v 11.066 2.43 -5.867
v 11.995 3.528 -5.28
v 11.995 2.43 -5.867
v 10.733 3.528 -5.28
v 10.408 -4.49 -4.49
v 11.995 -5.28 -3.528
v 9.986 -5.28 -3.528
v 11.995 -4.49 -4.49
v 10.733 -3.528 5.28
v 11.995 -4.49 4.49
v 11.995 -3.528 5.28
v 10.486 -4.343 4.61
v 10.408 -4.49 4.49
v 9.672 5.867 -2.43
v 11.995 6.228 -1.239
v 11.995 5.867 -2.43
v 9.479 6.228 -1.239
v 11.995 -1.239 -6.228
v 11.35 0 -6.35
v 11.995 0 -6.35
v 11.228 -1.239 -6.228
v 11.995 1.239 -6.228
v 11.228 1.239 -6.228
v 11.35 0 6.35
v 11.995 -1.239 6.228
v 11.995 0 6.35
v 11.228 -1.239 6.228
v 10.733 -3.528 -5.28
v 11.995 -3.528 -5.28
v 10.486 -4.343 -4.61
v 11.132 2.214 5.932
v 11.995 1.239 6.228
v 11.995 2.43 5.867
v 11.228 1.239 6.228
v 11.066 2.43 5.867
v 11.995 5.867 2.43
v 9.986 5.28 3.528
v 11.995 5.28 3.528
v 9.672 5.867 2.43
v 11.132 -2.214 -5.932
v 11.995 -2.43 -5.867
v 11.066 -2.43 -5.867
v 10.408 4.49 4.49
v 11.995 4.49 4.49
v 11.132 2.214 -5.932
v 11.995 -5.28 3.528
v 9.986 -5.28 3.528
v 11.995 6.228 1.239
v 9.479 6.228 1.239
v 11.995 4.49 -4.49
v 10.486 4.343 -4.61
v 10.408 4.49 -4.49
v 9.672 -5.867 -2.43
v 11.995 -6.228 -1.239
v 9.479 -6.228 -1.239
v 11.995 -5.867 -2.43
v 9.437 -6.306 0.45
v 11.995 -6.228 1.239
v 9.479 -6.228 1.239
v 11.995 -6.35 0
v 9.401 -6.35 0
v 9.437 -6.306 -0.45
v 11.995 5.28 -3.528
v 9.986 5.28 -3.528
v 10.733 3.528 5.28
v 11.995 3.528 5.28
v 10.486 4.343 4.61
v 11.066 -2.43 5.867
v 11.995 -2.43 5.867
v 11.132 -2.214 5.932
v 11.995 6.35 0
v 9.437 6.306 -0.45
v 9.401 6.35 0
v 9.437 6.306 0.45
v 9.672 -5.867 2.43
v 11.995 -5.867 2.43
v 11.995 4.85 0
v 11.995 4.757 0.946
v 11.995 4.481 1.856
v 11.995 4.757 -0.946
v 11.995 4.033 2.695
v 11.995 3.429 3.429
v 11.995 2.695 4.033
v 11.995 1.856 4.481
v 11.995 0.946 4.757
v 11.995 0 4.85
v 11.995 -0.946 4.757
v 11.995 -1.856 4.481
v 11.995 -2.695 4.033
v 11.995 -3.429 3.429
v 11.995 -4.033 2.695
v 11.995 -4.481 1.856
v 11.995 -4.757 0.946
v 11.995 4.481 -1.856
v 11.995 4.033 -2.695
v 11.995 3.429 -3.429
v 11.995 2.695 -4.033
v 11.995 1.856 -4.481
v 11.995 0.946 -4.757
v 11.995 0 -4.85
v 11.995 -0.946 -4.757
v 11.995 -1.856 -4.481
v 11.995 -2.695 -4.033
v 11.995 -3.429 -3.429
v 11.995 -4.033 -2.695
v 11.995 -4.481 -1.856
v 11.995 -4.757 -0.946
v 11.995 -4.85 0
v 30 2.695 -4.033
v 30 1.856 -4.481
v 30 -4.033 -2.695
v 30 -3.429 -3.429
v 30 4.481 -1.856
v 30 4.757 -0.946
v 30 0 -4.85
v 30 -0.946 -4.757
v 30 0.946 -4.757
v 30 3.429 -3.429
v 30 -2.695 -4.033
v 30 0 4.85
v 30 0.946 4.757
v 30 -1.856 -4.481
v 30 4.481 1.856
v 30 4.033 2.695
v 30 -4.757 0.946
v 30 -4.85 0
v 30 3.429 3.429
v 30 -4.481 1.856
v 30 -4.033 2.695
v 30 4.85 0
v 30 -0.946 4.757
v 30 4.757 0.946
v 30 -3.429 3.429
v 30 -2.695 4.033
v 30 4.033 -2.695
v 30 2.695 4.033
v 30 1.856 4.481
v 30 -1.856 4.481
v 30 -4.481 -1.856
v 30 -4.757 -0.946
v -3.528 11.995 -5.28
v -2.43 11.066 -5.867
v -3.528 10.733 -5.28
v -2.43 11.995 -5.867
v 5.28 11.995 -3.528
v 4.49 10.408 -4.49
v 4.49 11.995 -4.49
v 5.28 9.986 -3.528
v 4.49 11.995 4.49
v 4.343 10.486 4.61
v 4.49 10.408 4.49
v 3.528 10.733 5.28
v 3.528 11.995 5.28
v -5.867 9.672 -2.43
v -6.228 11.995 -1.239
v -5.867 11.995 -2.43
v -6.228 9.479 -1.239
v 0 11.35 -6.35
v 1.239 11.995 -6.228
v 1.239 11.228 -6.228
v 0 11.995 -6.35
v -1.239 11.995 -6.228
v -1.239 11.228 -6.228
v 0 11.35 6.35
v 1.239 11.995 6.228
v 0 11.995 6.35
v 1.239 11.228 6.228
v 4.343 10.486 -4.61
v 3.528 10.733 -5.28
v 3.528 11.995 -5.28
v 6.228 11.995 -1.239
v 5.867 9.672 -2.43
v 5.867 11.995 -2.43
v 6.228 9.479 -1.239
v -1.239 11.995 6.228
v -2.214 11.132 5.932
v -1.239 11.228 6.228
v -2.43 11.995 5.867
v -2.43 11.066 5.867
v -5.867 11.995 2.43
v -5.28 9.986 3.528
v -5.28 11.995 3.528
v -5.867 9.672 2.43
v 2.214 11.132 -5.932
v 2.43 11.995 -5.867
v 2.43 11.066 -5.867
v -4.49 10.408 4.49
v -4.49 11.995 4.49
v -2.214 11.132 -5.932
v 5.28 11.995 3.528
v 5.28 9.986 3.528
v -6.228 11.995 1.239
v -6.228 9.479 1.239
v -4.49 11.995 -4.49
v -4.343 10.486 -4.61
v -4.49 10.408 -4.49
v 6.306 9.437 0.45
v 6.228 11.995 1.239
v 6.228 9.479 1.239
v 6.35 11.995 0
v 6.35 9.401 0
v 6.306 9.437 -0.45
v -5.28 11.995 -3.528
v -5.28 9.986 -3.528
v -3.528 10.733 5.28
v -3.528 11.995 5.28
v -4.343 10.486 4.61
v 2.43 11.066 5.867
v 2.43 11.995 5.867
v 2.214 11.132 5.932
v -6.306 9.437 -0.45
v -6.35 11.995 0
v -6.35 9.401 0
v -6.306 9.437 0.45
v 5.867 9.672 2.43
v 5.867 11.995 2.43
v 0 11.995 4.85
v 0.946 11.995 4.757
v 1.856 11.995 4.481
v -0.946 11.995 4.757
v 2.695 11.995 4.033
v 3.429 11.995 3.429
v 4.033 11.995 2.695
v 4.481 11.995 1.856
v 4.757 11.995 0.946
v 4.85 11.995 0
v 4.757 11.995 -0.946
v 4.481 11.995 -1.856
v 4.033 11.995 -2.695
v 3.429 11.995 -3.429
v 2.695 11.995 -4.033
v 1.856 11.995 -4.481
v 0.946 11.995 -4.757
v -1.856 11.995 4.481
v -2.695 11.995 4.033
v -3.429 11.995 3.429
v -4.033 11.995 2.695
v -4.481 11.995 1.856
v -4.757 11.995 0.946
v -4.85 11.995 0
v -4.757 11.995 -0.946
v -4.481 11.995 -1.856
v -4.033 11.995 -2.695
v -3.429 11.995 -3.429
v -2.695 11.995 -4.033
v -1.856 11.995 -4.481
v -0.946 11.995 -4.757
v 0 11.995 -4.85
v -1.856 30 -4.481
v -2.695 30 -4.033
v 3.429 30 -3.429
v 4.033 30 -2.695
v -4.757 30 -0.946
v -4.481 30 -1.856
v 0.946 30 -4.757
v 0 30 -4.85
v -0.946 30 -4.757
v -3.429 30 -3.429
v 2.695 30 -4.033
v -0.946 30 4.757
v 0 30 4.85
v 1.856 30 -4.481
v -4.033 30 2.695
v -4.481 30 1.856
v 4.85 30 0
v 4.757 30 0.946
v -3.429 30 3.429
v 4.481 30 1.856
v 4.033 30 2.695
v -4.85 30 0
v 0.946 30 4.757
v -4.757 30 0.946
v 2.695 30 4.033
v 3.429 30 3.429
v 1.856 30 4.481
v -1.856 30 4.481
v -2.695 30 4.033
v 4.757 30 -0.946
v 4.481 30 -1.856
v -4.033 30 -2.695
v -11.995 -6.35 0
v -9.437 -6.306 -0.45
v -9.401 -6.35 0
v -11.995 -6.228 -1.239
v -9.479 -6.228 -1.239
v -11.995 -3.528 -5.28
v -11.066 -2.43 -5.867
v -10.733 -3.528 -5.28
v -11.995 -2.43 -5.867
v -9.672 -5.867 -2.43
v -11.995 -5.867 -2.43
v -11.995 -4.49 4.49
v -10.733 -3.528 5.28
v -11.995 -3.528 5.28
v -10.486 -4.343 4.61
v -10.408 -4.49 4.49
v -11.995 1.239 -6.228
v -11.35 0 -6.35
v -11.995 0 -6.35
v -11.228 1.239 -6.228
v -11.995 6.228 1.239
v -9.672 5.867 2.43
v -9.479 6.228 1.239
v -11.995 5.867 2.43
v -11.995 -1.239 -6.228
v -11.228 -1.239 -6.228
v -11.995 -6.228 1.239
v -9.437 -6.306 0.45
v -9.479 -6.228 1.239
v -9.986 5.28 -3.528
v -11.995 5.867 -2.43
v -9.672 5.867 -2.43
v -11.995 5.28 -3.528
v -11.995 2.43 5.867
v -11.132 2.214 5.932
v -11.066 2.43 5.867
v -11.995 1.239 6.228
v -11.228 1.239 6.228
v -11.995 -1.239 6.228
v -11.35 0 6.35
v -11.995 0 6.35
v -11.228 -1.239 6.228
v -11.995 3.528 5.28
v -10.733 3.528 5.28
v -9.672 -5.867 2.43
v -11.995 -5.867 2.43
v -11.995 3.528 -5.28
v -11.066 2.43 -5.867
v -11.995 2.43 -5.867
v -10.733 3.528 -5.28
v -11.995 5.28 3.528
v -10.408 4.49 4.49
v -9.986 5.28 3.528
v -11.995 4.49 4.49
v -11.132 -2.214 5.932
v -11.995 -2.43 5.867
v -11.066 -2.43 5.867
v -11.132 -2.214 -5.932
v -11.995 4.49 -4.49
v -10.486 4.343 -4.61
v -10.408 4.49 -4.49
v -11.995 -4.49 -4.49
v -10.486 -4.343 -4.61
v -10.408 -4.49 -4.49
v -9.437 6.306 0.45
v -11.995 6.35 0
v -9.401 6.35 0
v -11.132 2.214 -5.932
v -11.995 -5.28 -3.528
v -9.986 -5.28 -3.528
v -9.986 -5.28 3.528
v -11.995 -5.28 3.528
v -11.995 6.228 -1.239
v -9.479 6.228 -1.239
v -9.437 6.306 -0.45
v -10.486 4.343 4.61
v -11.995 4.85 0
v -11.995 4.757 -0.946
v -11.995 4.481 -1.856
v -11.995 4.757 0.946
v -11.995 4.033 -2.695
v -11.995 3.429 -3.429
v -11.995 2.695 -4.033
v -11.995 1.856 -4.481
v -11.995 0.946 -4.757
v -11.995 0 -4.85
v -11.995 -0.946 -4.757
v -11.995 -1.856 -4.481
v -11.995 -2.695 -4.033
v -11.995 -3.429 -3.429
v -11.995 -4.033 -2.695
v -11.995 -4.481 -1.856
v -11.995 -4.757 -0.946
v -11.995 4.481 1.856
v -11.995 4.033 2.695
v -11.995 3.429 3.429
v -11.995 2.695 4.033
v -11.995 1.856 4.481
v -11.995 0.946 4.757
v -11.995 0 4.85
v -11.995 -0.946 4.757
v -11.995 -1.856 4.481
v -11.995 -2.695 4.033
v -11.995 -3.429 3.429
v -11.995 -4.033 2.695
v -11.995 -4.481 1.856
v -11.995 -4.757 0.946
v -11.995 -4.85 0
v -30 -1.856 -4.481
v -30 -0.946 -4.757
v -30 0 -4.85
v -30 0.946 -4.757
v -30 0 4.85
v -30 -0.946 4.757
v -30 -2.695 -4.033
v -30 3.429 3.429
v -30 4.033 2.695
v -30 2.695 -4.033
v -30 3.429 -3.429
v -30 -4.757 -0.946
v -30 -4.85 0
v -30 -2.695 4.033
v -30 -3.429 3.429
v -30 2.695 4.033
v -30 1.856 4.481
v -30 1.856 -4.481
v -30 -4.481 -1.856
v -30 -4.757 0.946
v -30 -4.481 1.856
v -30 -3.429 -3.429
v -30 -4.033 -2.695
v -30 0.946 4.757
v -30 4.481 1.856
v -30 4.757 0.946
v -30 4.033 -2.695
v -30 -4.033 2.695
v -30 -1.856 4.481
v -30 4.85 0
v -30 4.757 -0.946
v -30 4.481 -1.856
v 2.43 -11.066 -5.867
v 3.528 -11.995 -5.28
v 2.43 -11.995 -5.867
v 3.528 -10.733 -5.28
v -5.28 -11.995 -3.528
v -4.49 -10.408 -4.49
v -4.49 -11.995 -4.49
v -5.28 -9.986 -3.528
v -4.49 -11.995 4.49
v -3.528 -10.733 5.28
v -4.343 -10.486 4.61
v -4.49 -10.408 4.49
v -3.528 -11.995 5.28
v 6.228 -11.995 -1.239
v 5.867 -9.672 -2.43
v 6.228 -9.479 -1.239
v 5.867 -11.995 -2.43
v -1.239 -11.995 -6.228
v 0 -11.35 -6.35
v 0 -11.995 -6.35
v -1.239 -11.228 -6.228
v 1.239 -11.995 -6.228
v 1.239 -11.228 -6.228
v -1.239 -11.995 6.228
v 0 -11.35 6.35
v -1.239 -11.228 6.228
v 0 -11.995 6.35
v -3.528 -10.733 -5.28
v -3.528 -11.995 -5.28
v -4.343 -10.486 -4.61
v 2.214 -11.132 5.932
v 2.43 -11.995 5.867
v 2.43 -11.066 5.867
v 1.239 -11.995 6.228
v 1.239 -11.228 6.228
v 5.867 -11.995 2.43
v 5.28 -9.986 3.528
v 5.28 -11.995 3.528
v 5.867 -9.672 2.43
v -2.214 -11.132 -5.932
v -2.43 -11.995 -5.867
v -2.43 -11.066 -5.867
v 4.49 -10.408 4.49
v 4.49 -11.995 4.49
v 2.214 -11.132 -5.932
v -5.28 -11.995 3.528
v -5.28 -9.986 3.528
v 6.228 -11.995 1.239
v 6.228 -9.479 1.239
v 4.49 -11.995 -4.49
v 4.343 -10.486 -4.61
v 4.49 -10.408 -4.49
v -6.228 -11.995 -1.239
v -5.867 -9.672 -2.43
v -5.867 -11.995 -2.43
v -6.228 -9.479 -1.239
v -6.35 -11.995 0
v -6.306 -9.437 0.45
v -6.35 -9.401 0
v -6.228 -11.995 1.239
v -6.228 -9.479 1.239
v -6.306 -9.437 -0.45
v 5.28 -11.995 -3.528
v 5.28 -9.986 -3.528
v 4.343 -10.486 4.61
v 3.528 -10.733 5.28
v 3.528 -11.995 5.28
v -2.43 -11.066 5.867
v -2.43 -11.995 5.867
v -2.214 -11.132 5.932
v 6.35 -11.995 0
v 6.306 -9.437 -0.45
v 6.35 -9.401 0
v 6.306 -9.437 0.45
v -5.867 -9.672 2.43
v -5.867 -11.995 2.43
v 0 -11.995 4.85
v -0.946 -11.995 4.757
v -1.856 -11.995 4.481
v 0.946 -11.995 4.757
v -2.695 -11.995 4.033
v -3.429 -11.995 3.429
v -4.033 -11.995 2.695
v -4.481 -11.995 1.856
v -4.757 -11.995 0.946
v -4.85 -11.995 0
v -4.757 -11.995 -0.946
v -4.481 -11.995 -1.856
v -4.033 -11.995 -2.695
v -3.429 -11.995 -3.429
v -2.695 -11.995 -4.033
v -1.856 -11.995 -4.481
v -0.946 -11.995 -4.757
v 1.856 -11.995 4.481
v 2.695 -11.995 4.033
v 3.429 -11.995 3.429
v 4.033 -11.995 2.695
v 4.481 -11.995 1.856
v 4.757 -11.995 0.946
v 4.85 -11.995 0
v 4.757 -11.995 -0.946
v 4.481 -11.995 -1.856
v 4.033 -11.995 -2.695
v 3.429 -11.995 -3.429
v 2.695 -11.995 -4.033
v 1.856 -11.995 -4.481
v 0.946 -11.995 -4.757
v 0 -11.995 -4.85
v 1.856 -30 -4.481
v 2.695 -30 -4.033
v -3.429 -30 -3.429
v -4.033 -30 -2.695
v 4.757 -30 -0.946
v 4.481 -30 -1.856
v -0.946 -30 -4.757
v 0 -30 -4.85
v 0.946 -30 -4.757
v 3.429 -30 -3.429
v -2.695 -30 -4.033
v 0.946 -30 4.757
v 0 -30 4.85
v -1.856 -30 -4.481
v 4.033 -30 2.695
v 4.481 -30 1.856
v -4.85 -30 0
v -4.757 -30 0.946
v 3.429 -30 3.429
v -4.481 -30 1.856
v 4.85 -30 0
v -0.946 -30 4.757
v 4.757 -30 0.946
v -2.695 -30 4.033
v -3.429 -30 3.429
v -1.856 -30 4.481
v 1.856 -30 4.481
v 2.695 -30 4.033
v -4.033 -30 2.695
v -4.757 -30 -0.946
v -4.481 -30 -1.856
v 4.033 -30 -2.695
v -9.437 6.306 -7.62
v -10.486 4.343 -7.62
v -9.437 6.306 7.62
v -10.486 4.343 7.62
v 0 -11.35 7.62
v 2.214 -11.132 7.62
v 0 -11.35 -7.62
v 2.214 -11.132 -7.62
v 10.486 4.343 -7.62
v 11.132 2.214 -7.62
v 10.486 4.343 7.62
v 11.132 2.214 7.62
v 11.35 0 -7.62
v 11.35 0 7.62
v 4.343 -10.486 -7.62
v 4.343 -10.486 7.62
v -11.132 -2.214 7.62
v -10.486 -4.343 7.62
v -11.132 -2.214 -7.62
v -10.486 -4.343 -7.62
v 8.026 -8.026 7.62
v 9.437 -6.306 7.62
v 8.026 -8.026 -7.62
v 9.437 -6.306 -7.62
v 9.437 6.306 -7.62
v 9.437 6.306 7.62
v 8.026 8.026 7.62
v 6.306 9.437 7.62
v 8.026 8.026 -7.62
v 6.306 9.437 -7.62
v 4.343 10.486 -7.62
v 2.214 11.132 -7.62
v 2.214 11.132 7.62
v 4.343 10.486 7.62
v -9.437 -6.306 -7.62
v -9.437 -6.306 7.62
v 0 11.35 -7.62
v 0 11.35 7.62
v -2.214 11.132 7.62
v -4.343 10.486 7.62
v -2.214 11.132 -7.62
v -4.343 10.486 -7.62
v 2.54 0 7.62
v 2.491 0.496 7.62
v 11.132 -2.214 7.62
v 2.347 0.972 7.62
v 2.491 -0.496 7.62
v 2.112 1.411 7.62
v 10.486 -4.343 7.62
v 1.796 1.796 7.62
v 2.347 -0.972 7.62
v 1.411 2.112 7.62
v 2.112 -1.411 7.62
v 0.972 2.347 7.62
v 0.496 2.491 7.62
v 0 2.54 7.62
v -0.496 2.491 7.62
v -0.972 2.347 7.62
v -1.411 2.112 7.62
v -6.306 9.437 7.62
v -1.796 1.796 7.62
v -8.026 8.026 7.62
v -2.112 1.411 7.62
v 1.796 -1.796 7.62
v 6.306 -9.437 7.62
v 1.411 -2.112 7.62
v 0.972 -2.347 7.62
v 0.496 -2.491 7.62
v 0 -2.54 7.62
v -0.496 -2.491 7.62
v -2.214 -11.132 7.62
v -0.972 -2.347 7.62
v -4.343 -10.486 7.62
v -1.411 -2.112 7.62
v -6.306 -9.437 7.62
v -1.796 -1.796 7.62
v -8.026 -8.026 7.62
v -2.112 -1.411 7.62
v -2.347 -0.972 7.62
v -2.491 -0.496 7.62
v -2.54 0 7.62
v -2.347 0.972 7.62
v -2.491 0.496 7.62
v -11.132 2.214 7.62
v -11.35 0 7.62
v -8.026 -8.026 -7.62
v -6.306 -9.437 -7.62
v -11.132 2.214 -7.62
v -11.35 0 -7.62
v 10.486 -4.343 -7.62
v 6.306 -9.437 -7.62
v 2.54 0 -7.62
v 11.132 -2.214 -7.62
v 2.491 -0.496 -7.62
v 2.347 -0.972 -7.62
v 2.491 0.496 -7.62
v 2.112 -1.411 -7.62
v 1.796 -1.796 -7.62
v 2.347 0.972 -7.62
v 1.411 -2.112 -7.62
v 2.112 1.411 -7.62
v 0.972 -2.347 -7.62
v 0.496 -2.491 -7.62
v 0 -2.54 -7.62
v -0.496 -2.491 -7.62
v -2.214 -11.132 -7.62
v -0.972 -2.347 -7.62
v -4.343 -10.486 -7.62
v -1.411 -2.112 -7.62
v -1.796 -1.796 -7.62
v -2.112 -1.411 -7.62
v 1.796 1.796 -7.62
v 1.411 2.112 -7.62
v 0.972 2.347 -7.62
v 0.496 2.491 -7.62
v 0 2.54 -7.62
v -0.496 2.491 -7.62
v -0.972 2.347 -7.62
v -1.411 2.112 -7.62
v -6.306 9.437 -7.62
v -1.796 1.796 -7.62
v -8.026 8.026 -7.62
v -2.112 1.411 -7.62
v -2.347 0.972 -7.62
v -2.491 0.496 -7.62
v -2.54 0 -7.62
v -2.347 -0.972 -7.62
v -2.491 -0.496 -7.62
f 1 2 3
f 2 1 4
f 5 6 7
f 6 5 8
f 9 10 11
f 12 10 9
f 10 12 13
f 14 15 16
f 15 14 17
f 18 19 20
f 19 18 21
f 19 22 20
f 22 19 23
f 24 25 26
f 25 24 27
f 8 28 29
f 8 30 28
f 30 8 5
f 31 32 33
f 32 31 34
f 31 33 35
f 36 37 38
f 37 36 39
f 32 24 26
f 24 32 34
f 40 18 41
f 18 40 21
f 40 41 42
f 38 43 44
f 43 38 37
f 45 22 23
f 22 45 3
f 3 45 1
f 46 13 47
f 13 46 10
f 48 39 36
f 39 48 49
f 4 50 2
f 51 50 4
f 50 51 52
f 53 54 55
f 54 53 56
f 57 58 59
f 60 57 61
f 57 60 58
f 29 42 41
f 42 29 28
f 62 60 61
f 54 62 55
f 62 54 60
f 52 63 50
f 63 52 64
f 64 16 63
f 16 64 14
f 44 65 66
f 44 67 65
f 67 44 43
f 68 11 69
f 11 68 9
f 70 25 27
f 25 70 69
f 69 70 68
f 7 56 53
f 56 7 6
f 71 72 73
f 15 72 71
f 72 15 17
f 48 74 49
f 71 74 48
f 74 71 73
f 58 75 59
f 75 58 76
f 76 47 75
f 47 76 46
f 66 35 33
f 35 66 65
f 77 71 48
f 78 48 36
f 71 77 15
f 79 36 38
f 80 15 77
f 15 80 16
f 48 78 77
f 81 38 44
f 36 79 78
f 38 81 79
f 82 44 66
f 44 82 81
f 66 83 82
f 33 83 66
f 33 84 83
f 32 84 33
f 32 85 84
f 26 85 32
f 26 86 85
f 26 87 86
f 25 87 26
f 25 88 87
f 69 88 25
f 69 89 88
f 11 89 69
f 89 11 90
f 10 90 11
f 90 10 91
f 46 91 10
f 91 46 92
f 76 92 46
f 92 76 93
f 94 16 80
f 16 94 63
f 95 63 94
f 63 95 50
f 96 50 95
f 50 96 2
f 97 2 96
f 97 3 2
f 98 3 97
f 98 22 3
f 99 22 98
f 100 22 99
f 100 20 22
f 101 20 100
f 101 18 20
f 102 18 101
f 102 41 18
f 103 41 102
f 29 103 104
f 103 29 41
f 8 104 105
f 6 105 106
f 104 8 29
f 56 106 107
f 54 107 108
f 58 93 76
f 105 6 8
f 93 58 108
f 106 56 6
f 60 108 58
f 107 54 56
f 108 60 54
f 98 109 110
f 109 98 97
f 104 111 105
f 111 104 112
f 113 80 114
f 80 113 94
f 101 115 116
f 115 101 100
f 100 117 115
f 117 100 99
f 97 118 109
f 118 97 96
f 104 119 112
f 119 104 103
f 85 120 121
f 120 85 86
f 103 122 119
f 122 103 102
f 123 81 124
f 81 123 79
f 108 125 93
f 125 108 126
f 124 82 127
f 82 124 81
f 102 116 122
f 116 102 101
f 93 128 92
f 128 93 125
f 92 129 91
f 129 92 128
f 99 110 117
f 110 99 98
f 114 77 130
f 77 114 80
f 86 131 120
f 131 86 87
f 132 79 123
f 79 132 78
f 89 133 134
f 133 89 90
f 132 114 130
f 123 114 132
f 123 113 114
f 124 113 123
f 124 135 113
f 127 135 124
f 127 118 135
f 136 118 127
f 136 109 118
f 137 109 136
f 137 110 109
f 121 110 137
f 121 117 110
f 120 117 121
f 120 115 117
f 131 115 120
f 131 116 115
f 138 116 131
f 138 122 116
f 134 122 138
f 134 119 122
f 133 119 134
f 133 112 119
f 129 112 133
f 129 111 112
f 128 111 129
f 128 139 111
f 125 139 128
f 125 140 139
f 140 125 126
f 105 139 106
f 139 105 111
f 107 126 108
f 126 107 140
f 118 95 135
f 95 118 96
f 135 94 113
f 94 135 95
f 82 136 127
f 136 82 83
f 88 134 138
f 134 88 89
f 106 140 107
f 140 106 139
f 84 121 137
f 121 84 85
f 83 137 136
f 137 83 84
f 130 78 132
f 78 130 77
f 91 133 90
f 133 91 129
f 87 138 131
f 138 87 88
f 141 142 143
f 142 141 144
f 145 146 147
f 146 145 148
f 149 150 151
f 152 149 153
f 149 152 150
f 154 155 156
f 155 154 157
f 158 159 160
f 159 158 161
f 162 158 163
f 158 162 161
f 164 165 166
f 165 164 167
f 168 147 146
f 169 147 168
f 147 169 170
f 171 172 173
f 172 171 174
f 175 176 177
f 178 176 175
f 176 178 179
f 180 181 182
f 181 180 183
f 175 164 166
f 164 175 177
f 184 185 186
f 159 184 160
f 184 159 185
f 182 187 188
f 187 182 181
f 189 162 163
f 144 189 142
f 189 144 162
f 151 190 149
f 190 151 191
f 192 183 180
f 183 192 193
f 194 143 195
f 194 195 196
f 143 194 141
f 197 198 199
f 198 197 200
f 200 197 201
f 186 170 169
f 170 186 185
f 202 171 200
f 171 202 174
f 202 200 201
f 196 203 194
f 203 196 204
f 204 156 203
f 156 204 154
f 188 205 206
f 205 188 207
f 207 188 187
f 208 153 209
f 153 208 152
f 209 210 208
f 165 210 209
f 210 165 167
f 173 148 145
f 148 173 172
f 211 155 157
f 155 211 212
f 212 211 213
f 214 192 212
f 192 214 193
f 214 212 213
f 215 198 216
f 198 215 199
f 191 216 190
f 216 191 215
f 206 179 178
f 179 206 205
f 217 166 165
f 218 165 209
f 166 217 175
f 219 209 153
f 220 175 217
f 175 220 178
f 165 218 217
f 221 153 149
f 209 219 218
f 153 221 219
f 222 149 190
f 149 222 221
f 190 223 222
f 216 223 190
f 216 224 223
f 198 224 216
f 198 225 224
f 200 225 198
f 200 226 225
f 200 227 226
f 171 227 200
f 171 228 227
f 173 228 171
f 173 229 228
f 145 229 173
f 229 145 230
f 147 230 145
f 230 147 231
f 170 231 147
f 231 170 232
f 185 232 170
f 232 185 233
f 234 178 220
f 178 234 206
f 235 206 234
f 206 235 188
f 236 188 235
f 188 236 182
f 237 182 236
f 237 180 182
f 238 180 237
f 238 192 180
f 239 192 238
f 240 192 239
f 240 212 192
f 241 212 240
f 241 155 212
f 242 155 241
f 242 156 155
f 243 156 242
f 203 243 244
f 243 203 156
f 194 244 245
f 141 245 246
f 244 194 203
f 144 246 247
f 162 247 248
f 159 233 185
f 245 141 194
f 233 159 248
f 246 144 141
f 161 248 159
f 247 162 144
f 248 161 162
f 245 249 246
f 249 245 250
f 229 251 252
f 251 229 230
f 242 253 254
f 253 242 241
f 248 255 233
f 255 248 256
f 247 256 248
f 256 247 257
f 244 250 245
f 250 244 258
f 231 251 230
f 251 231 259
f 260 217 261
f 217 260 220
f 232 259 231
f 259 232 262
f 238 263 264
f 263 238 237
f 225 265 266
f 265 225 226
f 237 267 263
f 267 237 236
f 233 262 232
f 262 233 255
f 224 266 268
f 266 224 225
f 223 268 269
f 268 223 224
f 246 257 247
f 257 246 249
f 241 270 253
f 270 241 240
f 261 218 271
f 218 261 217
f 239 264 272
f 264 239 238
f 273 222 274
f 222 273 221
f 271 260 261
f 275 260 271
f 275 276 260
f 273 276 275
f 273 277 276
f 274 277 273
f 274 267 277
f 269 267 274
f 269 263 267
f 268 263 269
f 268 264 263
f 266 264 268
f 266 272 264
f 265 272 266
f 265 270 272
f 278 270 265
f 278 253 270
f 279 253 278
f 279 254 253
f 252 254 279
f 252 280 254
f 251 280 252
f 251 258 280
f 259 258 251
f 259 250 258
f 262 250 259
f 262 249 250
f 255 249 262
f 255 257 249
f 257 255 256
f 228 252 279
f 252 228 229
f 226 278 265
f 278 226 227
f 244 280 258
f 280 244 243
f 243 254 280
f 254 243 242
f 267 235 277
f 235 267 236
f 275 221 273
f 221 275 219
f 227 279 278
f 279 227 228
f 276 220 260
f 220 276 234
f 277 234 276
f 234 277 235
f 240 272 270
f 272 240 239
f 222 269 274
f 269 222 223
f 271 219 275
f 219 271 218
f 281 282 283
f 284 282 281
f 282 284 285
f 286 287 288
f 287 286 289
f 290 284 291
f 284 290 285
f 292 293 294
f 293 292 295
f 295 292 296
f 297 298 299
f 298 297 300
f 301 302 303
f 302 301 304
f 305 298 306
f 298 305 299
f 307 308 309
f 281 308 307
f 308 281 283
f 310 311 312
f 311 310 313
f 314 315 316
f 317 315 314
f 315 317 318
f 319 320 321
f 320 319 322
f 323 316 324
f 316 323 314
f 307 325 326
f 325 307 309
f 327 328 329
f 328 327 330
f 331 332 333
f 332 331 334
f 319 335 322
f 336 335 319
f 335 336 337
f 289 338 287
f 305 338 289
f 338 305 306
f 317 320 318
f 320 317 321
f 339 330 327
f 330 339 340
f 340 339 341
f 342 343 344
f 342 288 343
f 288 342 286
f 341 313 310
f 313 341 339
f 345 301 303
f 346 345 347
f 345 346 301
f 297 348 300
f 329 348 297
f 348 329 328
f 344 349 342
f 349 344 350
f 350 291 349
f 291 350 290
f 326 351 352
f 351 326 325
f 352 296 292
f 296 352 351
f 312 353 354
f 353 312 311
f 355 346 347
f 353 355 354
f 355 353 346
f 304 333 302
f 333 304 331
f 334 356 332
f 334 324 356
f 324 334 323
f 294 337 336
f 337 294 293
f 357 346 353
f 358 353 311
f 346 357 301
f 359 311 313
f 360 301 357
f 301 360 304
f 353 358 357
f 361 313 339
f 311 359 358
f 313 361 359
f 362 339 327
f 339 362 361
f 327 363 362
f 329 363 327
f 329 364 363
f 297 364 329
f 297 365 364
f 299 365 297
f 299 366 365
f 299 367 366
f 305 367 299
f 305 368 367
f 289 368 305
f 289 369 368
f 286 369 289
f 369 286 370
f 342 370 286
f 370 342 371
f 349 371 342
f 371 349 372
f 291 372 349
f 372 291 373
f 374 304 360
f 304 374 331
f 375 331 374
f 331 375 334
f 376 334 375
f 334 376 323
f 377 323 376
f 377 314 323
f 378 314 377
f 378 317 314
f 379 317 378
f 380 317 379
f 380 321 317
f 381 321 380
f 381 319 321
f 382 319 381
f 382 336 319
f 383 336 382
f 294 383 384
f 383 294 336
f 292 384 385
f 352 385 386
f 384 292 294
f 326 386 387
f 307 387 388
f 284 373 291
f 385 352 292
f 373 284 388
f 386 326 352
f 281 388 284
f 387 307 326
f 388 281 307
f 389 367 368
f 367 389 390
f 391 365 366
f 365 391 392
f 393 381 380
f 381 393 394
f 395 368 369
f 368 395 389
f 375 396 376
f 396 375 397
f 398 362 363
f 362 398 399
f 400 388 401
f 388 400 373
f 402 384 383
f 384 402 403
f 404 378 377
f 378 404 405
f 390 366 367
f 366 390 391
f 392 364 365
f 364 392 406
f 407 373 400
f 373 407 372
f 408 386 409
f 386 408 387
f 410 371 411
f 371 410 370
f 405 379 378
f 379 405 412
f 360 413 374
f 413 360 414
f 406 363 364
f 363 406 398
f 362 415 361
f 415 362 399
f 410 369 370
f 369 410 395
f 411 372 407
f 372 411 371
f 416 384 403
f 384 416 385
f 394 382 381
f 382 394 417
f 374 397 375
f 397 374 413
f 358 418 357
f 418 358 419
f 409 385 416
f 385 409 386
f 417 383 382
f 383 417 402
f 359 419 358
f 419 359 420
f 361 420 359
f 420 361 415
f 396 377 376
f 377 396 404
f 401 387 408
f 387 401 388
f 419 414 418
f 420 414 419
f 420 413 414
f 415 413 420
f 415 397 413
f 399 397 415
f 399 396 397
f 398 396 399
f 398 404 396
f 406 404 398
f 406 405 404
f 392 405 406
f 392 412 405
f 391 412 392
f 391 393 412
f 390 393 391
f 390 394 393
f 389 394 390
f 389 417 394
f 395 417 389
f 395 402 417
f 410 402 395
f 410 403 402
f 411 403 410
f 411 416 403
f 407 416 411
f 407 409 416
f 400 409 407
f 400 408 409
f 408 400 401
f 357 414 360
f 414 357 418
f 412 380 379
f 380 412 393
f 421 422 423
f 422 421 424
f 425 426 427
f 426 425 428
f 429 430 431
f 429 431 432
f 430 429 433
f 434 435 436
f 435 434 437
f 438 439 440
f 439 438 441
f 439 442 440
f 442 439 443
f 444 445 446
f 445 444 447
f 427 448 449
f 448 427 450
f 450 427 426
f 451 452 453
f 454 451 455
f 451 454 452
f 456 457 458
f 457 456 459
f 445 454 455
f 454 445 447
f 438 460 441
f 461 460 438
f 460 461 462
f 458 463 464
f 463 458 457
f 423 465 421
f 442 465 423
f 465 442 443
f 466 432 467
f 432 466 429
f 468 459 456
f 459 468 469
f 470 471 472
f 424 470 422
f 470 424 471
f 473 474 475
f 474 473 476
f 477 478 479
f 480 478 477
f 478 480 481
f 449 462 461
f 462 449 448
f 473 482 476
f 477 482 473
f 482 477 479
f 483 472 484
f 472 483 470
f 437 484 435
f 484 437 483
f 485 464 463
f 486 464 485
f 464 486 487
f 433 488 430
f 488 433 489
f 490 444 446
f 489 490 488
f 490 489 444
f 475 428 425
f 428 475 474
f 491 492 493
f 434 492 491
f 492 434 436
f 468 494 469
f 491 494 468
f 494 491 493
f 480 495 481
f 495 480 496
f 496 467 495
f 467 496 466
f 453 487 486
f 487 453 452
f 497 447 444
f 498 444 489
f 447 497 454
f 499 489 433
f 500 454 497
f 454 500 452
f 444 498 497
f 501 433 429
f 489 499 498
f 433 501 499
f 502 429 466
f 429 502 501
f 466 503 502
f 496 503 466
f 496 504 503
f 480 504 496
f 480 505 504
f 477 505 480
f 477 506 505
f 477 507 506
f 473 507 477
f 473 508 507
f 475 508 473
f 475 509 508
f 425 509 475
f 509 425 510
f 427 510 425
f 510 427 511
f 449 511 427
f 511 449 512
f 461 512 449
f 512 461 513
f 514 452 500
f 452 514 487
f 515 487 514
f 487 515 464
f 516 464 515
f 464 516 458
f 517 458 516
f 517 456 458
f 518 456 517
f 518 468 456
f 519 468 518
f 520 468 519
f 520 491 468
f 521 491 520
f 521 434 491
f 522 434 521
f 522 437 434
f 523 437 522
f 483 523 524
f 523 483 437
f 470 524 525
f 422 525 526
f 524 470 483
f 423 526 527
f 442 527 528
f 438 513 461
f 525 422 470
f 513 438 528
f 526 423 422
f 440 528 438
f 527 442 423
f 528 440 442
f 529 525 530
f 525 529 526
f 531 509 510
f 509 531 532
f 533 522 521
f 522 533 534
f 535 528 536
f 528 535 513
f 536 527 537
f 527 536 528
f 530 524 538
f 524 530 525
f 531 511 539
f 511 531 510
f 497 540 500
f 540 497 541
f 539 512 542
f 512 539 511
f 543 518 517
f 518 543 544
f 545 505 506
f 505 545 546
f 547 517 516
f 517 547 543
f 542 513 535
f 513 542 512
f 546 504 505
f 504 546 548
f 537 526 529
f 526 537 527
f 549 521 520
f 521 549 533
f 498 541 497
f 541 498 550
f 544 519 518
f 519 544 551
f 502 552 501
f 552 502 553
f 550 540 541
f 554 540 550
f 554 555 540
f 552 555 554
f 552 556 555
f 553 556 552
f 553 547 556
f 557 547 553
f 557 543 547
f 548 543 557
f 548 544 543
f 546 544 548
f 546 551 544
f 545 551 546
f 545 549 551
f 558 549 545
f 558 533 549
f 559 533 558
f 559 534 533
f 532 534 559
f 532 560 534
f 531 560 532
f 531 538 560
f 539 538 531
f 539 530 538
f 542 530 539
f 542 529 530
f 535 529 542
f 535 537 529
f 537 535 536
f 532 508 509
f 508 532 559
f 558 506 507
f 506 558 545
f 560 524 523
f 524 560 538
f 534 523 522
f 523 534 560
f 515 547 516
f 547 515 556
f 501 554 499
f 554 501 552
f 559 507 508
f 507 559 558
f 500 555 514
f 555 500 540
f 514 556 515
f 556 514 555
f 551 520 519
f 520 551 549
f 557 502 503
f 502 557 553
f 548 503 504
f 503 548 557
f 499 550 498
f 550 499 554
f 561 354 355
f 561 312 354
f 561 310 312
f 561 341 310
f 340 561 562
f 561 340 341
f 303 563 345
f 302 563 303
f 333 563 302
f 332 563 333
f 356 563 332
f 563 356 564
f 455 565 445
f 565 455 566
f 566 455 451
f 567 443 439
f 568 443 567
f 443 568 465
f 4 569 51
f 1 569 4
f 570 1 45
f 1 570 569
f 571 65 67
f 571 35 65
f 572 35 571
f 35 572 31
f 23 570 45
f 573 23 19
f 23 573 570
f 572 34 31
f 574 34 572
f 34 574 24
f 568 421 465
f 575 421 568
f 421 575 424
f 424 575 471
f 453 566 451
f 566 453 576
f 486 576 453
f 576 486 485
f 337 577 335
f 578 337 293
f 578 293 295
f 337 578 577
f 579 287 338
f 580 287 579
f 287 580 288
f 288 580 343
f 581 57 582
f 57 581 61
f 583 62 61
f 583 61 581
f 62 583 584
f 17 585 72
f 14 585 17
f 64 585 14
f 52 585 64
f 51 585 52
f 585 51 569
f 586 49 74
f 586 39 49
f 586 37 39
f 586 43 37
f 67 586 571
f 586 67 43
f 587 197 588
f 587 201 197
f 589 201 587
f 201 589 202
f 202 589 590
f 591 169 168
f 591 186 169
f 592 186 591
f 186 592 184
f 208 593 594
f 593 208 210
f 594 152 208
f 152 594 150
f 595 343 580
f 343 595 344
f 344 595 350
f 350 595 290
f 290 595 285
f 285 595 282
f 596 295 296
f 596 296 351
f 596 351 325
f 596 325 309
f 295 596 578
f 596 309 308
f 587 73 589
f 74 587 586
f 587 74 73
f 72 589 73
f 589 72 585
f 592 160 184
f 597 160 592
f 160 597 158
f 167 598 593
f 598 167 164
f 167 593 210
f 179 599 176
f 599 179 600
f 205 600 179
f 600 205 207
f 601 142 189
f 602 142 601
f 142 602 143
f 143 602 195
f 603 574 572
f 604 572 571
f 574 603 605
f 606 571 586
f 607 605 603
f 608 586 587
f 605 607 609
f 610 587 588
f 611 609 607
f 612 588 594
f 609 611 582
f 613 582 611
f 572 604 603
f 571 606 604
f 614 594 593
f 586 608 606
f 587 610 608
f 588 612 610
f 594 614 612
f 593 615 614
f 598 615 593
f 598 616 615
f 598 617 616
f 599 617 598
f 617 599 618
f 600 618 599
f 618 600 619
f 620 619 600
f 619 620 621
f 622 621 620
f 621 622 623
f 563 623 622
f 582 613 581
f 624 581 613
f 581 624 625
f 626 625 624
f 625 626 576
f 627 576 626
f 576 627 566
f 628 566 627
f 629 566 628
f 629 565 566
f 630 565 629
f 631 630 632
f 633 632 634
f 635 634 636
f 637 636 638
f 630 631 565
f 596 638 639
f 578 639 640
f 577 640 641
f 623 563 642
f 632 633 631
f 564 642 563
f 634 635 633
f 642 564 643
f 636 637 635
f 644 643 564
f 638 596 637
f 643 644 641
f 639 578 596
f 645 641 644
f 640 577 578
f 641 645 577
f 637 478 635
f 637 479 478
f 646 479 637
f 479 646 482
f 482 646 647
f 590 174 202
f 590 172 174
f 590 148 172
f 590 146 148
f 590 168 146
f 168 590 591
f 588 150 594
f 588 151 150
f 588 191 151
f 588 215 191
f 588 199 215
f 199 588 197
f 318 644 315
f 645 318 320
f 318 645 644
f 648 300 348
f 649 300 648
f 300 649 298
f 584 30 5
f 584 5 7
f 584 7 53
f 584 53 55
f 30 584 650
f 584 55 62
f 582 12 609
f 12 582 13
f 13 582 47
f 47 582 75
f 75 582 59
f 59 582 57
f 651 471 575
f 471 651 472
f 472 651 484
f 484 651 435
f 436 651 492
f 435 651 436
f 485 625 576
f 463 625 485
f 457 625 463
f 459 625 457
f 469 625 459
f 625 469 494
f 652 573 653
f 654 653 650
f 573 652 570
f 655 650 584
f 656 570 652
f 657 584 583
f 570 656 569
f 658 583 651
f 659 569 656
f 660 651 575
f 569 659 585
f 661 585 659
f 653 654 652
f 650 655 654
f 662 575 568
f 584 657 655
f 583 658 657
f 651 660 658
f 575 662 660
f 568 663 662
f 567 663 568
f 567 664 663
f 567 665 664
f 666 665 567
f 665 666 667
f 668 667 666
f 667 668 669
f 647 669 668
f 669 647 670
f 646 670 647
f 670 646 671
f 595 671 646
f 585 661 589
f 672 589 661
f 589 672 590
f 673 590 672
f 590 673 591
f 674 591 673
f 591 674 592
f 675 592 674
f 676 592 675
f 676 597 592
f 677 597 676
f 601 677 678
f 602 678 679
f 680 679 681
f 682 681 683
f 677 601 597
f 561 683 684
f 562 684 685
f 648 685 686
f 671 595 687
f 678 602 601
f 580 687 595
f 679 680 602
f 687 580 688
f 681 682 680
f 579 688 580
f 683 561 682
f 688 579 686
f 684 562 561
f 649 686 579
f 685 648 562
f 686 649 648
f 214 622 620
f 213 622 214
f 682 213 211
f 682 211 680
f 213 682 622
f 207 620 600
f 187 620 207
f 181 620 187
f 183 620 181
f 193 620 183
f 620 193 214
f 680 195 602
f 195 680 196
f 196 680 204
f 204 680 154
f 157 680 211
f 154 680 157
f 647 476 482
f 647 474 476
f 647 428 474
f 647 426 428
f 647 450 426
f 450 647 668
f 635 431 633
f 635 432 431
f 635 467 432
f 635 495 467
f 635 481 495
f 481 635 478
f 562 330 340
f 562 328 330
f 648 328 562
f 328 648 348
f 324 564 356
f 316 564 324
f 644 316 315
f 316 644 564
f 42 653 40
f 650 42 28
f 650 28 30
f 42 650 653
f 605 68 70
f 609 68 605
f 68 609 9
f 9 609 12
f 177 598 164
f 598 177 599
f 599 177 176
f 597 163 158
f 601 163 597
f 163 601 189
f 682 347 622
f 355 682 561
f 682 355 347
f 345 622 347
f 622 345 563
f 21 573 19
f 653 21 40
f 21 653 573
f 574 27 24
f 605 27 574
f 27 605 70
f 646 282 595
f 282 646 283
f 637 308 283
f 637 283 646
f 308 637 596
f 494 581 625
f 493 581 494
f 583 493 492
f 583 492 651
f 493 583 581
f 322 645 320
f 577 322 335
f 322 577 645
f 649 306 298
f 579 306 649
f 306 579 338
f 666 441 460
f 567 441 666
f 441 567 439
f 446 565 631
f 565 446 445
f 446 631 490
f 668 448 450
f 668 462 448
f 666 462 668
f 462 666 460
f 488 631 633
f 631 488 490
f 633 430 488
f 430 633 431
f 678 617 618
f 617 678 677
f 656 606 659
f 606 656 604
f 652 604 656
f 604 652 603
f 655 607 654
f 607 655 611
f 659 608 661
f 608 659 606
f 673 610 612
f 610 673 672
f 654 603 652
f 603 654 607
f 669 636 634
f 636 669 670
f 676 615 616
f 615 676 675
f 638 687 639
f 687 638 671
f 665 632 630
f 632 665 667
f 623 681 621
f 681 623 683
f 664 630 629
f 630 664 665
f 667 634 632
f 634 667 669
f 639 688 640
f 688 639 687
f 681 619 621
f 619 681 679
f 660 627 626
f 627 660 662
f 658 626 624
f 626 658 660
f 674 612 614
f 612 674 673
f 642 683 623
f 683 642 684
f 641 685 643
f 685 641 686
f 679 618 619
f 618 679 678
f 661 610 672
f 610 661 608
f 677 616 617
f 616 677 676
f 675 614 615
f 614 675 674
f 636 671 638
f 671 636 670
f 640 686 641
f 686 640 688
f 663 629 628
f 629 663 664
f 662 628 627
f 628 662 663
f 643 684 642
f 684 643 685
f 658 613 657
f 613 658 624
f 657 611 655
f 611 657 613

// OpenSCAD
$fn = 32;

// ----------------------------------------------------------------------
// Cardan cross: 60 mm span, 12.7 mm trunnions
// ----------------------------------------------------------------------

// --- parameters (mm) ---
journal_d = 12.7;         // trunnion diameter
arm_len = 30;             // trunnion length from the centre
step_r = 4.32;            // step position from the centre
step_d = 9.7;             // journal diameter after the step
hub_d = 22.7;             // hub diameter
hub_h = 15.24;            // hub height
bore_d = 5.08;            // hub bore

difference() {
  union() {
    /* hub along the joint axis */
    cylinder(h = hub_h, d = hub_d, center = true);
    for (a = [0 : 90 : 270]) rotate([0, 0, a]) {
      /* trunnion, sunk into the hub */
      translate([hub_d / 4, 0, 0]) rotate([0, 90, 0]) cylinder(h = step_r + 2, d = journal_d);
      /* stepped journal out to the tip */
      translate([step_r - 0.5, 0, 0]) rotate([0, 90, 0]) cylinder(h = arm_len + 0.5 - step_r, d = step_d);
    }
  }
  /* lubrication bore through the hub, 2.5 mm clear on both sides */
  translate([0, 0, -hub_h / 2 - 2.5]) cylinder(h = hub_h + 5, d = bore_d);
}
